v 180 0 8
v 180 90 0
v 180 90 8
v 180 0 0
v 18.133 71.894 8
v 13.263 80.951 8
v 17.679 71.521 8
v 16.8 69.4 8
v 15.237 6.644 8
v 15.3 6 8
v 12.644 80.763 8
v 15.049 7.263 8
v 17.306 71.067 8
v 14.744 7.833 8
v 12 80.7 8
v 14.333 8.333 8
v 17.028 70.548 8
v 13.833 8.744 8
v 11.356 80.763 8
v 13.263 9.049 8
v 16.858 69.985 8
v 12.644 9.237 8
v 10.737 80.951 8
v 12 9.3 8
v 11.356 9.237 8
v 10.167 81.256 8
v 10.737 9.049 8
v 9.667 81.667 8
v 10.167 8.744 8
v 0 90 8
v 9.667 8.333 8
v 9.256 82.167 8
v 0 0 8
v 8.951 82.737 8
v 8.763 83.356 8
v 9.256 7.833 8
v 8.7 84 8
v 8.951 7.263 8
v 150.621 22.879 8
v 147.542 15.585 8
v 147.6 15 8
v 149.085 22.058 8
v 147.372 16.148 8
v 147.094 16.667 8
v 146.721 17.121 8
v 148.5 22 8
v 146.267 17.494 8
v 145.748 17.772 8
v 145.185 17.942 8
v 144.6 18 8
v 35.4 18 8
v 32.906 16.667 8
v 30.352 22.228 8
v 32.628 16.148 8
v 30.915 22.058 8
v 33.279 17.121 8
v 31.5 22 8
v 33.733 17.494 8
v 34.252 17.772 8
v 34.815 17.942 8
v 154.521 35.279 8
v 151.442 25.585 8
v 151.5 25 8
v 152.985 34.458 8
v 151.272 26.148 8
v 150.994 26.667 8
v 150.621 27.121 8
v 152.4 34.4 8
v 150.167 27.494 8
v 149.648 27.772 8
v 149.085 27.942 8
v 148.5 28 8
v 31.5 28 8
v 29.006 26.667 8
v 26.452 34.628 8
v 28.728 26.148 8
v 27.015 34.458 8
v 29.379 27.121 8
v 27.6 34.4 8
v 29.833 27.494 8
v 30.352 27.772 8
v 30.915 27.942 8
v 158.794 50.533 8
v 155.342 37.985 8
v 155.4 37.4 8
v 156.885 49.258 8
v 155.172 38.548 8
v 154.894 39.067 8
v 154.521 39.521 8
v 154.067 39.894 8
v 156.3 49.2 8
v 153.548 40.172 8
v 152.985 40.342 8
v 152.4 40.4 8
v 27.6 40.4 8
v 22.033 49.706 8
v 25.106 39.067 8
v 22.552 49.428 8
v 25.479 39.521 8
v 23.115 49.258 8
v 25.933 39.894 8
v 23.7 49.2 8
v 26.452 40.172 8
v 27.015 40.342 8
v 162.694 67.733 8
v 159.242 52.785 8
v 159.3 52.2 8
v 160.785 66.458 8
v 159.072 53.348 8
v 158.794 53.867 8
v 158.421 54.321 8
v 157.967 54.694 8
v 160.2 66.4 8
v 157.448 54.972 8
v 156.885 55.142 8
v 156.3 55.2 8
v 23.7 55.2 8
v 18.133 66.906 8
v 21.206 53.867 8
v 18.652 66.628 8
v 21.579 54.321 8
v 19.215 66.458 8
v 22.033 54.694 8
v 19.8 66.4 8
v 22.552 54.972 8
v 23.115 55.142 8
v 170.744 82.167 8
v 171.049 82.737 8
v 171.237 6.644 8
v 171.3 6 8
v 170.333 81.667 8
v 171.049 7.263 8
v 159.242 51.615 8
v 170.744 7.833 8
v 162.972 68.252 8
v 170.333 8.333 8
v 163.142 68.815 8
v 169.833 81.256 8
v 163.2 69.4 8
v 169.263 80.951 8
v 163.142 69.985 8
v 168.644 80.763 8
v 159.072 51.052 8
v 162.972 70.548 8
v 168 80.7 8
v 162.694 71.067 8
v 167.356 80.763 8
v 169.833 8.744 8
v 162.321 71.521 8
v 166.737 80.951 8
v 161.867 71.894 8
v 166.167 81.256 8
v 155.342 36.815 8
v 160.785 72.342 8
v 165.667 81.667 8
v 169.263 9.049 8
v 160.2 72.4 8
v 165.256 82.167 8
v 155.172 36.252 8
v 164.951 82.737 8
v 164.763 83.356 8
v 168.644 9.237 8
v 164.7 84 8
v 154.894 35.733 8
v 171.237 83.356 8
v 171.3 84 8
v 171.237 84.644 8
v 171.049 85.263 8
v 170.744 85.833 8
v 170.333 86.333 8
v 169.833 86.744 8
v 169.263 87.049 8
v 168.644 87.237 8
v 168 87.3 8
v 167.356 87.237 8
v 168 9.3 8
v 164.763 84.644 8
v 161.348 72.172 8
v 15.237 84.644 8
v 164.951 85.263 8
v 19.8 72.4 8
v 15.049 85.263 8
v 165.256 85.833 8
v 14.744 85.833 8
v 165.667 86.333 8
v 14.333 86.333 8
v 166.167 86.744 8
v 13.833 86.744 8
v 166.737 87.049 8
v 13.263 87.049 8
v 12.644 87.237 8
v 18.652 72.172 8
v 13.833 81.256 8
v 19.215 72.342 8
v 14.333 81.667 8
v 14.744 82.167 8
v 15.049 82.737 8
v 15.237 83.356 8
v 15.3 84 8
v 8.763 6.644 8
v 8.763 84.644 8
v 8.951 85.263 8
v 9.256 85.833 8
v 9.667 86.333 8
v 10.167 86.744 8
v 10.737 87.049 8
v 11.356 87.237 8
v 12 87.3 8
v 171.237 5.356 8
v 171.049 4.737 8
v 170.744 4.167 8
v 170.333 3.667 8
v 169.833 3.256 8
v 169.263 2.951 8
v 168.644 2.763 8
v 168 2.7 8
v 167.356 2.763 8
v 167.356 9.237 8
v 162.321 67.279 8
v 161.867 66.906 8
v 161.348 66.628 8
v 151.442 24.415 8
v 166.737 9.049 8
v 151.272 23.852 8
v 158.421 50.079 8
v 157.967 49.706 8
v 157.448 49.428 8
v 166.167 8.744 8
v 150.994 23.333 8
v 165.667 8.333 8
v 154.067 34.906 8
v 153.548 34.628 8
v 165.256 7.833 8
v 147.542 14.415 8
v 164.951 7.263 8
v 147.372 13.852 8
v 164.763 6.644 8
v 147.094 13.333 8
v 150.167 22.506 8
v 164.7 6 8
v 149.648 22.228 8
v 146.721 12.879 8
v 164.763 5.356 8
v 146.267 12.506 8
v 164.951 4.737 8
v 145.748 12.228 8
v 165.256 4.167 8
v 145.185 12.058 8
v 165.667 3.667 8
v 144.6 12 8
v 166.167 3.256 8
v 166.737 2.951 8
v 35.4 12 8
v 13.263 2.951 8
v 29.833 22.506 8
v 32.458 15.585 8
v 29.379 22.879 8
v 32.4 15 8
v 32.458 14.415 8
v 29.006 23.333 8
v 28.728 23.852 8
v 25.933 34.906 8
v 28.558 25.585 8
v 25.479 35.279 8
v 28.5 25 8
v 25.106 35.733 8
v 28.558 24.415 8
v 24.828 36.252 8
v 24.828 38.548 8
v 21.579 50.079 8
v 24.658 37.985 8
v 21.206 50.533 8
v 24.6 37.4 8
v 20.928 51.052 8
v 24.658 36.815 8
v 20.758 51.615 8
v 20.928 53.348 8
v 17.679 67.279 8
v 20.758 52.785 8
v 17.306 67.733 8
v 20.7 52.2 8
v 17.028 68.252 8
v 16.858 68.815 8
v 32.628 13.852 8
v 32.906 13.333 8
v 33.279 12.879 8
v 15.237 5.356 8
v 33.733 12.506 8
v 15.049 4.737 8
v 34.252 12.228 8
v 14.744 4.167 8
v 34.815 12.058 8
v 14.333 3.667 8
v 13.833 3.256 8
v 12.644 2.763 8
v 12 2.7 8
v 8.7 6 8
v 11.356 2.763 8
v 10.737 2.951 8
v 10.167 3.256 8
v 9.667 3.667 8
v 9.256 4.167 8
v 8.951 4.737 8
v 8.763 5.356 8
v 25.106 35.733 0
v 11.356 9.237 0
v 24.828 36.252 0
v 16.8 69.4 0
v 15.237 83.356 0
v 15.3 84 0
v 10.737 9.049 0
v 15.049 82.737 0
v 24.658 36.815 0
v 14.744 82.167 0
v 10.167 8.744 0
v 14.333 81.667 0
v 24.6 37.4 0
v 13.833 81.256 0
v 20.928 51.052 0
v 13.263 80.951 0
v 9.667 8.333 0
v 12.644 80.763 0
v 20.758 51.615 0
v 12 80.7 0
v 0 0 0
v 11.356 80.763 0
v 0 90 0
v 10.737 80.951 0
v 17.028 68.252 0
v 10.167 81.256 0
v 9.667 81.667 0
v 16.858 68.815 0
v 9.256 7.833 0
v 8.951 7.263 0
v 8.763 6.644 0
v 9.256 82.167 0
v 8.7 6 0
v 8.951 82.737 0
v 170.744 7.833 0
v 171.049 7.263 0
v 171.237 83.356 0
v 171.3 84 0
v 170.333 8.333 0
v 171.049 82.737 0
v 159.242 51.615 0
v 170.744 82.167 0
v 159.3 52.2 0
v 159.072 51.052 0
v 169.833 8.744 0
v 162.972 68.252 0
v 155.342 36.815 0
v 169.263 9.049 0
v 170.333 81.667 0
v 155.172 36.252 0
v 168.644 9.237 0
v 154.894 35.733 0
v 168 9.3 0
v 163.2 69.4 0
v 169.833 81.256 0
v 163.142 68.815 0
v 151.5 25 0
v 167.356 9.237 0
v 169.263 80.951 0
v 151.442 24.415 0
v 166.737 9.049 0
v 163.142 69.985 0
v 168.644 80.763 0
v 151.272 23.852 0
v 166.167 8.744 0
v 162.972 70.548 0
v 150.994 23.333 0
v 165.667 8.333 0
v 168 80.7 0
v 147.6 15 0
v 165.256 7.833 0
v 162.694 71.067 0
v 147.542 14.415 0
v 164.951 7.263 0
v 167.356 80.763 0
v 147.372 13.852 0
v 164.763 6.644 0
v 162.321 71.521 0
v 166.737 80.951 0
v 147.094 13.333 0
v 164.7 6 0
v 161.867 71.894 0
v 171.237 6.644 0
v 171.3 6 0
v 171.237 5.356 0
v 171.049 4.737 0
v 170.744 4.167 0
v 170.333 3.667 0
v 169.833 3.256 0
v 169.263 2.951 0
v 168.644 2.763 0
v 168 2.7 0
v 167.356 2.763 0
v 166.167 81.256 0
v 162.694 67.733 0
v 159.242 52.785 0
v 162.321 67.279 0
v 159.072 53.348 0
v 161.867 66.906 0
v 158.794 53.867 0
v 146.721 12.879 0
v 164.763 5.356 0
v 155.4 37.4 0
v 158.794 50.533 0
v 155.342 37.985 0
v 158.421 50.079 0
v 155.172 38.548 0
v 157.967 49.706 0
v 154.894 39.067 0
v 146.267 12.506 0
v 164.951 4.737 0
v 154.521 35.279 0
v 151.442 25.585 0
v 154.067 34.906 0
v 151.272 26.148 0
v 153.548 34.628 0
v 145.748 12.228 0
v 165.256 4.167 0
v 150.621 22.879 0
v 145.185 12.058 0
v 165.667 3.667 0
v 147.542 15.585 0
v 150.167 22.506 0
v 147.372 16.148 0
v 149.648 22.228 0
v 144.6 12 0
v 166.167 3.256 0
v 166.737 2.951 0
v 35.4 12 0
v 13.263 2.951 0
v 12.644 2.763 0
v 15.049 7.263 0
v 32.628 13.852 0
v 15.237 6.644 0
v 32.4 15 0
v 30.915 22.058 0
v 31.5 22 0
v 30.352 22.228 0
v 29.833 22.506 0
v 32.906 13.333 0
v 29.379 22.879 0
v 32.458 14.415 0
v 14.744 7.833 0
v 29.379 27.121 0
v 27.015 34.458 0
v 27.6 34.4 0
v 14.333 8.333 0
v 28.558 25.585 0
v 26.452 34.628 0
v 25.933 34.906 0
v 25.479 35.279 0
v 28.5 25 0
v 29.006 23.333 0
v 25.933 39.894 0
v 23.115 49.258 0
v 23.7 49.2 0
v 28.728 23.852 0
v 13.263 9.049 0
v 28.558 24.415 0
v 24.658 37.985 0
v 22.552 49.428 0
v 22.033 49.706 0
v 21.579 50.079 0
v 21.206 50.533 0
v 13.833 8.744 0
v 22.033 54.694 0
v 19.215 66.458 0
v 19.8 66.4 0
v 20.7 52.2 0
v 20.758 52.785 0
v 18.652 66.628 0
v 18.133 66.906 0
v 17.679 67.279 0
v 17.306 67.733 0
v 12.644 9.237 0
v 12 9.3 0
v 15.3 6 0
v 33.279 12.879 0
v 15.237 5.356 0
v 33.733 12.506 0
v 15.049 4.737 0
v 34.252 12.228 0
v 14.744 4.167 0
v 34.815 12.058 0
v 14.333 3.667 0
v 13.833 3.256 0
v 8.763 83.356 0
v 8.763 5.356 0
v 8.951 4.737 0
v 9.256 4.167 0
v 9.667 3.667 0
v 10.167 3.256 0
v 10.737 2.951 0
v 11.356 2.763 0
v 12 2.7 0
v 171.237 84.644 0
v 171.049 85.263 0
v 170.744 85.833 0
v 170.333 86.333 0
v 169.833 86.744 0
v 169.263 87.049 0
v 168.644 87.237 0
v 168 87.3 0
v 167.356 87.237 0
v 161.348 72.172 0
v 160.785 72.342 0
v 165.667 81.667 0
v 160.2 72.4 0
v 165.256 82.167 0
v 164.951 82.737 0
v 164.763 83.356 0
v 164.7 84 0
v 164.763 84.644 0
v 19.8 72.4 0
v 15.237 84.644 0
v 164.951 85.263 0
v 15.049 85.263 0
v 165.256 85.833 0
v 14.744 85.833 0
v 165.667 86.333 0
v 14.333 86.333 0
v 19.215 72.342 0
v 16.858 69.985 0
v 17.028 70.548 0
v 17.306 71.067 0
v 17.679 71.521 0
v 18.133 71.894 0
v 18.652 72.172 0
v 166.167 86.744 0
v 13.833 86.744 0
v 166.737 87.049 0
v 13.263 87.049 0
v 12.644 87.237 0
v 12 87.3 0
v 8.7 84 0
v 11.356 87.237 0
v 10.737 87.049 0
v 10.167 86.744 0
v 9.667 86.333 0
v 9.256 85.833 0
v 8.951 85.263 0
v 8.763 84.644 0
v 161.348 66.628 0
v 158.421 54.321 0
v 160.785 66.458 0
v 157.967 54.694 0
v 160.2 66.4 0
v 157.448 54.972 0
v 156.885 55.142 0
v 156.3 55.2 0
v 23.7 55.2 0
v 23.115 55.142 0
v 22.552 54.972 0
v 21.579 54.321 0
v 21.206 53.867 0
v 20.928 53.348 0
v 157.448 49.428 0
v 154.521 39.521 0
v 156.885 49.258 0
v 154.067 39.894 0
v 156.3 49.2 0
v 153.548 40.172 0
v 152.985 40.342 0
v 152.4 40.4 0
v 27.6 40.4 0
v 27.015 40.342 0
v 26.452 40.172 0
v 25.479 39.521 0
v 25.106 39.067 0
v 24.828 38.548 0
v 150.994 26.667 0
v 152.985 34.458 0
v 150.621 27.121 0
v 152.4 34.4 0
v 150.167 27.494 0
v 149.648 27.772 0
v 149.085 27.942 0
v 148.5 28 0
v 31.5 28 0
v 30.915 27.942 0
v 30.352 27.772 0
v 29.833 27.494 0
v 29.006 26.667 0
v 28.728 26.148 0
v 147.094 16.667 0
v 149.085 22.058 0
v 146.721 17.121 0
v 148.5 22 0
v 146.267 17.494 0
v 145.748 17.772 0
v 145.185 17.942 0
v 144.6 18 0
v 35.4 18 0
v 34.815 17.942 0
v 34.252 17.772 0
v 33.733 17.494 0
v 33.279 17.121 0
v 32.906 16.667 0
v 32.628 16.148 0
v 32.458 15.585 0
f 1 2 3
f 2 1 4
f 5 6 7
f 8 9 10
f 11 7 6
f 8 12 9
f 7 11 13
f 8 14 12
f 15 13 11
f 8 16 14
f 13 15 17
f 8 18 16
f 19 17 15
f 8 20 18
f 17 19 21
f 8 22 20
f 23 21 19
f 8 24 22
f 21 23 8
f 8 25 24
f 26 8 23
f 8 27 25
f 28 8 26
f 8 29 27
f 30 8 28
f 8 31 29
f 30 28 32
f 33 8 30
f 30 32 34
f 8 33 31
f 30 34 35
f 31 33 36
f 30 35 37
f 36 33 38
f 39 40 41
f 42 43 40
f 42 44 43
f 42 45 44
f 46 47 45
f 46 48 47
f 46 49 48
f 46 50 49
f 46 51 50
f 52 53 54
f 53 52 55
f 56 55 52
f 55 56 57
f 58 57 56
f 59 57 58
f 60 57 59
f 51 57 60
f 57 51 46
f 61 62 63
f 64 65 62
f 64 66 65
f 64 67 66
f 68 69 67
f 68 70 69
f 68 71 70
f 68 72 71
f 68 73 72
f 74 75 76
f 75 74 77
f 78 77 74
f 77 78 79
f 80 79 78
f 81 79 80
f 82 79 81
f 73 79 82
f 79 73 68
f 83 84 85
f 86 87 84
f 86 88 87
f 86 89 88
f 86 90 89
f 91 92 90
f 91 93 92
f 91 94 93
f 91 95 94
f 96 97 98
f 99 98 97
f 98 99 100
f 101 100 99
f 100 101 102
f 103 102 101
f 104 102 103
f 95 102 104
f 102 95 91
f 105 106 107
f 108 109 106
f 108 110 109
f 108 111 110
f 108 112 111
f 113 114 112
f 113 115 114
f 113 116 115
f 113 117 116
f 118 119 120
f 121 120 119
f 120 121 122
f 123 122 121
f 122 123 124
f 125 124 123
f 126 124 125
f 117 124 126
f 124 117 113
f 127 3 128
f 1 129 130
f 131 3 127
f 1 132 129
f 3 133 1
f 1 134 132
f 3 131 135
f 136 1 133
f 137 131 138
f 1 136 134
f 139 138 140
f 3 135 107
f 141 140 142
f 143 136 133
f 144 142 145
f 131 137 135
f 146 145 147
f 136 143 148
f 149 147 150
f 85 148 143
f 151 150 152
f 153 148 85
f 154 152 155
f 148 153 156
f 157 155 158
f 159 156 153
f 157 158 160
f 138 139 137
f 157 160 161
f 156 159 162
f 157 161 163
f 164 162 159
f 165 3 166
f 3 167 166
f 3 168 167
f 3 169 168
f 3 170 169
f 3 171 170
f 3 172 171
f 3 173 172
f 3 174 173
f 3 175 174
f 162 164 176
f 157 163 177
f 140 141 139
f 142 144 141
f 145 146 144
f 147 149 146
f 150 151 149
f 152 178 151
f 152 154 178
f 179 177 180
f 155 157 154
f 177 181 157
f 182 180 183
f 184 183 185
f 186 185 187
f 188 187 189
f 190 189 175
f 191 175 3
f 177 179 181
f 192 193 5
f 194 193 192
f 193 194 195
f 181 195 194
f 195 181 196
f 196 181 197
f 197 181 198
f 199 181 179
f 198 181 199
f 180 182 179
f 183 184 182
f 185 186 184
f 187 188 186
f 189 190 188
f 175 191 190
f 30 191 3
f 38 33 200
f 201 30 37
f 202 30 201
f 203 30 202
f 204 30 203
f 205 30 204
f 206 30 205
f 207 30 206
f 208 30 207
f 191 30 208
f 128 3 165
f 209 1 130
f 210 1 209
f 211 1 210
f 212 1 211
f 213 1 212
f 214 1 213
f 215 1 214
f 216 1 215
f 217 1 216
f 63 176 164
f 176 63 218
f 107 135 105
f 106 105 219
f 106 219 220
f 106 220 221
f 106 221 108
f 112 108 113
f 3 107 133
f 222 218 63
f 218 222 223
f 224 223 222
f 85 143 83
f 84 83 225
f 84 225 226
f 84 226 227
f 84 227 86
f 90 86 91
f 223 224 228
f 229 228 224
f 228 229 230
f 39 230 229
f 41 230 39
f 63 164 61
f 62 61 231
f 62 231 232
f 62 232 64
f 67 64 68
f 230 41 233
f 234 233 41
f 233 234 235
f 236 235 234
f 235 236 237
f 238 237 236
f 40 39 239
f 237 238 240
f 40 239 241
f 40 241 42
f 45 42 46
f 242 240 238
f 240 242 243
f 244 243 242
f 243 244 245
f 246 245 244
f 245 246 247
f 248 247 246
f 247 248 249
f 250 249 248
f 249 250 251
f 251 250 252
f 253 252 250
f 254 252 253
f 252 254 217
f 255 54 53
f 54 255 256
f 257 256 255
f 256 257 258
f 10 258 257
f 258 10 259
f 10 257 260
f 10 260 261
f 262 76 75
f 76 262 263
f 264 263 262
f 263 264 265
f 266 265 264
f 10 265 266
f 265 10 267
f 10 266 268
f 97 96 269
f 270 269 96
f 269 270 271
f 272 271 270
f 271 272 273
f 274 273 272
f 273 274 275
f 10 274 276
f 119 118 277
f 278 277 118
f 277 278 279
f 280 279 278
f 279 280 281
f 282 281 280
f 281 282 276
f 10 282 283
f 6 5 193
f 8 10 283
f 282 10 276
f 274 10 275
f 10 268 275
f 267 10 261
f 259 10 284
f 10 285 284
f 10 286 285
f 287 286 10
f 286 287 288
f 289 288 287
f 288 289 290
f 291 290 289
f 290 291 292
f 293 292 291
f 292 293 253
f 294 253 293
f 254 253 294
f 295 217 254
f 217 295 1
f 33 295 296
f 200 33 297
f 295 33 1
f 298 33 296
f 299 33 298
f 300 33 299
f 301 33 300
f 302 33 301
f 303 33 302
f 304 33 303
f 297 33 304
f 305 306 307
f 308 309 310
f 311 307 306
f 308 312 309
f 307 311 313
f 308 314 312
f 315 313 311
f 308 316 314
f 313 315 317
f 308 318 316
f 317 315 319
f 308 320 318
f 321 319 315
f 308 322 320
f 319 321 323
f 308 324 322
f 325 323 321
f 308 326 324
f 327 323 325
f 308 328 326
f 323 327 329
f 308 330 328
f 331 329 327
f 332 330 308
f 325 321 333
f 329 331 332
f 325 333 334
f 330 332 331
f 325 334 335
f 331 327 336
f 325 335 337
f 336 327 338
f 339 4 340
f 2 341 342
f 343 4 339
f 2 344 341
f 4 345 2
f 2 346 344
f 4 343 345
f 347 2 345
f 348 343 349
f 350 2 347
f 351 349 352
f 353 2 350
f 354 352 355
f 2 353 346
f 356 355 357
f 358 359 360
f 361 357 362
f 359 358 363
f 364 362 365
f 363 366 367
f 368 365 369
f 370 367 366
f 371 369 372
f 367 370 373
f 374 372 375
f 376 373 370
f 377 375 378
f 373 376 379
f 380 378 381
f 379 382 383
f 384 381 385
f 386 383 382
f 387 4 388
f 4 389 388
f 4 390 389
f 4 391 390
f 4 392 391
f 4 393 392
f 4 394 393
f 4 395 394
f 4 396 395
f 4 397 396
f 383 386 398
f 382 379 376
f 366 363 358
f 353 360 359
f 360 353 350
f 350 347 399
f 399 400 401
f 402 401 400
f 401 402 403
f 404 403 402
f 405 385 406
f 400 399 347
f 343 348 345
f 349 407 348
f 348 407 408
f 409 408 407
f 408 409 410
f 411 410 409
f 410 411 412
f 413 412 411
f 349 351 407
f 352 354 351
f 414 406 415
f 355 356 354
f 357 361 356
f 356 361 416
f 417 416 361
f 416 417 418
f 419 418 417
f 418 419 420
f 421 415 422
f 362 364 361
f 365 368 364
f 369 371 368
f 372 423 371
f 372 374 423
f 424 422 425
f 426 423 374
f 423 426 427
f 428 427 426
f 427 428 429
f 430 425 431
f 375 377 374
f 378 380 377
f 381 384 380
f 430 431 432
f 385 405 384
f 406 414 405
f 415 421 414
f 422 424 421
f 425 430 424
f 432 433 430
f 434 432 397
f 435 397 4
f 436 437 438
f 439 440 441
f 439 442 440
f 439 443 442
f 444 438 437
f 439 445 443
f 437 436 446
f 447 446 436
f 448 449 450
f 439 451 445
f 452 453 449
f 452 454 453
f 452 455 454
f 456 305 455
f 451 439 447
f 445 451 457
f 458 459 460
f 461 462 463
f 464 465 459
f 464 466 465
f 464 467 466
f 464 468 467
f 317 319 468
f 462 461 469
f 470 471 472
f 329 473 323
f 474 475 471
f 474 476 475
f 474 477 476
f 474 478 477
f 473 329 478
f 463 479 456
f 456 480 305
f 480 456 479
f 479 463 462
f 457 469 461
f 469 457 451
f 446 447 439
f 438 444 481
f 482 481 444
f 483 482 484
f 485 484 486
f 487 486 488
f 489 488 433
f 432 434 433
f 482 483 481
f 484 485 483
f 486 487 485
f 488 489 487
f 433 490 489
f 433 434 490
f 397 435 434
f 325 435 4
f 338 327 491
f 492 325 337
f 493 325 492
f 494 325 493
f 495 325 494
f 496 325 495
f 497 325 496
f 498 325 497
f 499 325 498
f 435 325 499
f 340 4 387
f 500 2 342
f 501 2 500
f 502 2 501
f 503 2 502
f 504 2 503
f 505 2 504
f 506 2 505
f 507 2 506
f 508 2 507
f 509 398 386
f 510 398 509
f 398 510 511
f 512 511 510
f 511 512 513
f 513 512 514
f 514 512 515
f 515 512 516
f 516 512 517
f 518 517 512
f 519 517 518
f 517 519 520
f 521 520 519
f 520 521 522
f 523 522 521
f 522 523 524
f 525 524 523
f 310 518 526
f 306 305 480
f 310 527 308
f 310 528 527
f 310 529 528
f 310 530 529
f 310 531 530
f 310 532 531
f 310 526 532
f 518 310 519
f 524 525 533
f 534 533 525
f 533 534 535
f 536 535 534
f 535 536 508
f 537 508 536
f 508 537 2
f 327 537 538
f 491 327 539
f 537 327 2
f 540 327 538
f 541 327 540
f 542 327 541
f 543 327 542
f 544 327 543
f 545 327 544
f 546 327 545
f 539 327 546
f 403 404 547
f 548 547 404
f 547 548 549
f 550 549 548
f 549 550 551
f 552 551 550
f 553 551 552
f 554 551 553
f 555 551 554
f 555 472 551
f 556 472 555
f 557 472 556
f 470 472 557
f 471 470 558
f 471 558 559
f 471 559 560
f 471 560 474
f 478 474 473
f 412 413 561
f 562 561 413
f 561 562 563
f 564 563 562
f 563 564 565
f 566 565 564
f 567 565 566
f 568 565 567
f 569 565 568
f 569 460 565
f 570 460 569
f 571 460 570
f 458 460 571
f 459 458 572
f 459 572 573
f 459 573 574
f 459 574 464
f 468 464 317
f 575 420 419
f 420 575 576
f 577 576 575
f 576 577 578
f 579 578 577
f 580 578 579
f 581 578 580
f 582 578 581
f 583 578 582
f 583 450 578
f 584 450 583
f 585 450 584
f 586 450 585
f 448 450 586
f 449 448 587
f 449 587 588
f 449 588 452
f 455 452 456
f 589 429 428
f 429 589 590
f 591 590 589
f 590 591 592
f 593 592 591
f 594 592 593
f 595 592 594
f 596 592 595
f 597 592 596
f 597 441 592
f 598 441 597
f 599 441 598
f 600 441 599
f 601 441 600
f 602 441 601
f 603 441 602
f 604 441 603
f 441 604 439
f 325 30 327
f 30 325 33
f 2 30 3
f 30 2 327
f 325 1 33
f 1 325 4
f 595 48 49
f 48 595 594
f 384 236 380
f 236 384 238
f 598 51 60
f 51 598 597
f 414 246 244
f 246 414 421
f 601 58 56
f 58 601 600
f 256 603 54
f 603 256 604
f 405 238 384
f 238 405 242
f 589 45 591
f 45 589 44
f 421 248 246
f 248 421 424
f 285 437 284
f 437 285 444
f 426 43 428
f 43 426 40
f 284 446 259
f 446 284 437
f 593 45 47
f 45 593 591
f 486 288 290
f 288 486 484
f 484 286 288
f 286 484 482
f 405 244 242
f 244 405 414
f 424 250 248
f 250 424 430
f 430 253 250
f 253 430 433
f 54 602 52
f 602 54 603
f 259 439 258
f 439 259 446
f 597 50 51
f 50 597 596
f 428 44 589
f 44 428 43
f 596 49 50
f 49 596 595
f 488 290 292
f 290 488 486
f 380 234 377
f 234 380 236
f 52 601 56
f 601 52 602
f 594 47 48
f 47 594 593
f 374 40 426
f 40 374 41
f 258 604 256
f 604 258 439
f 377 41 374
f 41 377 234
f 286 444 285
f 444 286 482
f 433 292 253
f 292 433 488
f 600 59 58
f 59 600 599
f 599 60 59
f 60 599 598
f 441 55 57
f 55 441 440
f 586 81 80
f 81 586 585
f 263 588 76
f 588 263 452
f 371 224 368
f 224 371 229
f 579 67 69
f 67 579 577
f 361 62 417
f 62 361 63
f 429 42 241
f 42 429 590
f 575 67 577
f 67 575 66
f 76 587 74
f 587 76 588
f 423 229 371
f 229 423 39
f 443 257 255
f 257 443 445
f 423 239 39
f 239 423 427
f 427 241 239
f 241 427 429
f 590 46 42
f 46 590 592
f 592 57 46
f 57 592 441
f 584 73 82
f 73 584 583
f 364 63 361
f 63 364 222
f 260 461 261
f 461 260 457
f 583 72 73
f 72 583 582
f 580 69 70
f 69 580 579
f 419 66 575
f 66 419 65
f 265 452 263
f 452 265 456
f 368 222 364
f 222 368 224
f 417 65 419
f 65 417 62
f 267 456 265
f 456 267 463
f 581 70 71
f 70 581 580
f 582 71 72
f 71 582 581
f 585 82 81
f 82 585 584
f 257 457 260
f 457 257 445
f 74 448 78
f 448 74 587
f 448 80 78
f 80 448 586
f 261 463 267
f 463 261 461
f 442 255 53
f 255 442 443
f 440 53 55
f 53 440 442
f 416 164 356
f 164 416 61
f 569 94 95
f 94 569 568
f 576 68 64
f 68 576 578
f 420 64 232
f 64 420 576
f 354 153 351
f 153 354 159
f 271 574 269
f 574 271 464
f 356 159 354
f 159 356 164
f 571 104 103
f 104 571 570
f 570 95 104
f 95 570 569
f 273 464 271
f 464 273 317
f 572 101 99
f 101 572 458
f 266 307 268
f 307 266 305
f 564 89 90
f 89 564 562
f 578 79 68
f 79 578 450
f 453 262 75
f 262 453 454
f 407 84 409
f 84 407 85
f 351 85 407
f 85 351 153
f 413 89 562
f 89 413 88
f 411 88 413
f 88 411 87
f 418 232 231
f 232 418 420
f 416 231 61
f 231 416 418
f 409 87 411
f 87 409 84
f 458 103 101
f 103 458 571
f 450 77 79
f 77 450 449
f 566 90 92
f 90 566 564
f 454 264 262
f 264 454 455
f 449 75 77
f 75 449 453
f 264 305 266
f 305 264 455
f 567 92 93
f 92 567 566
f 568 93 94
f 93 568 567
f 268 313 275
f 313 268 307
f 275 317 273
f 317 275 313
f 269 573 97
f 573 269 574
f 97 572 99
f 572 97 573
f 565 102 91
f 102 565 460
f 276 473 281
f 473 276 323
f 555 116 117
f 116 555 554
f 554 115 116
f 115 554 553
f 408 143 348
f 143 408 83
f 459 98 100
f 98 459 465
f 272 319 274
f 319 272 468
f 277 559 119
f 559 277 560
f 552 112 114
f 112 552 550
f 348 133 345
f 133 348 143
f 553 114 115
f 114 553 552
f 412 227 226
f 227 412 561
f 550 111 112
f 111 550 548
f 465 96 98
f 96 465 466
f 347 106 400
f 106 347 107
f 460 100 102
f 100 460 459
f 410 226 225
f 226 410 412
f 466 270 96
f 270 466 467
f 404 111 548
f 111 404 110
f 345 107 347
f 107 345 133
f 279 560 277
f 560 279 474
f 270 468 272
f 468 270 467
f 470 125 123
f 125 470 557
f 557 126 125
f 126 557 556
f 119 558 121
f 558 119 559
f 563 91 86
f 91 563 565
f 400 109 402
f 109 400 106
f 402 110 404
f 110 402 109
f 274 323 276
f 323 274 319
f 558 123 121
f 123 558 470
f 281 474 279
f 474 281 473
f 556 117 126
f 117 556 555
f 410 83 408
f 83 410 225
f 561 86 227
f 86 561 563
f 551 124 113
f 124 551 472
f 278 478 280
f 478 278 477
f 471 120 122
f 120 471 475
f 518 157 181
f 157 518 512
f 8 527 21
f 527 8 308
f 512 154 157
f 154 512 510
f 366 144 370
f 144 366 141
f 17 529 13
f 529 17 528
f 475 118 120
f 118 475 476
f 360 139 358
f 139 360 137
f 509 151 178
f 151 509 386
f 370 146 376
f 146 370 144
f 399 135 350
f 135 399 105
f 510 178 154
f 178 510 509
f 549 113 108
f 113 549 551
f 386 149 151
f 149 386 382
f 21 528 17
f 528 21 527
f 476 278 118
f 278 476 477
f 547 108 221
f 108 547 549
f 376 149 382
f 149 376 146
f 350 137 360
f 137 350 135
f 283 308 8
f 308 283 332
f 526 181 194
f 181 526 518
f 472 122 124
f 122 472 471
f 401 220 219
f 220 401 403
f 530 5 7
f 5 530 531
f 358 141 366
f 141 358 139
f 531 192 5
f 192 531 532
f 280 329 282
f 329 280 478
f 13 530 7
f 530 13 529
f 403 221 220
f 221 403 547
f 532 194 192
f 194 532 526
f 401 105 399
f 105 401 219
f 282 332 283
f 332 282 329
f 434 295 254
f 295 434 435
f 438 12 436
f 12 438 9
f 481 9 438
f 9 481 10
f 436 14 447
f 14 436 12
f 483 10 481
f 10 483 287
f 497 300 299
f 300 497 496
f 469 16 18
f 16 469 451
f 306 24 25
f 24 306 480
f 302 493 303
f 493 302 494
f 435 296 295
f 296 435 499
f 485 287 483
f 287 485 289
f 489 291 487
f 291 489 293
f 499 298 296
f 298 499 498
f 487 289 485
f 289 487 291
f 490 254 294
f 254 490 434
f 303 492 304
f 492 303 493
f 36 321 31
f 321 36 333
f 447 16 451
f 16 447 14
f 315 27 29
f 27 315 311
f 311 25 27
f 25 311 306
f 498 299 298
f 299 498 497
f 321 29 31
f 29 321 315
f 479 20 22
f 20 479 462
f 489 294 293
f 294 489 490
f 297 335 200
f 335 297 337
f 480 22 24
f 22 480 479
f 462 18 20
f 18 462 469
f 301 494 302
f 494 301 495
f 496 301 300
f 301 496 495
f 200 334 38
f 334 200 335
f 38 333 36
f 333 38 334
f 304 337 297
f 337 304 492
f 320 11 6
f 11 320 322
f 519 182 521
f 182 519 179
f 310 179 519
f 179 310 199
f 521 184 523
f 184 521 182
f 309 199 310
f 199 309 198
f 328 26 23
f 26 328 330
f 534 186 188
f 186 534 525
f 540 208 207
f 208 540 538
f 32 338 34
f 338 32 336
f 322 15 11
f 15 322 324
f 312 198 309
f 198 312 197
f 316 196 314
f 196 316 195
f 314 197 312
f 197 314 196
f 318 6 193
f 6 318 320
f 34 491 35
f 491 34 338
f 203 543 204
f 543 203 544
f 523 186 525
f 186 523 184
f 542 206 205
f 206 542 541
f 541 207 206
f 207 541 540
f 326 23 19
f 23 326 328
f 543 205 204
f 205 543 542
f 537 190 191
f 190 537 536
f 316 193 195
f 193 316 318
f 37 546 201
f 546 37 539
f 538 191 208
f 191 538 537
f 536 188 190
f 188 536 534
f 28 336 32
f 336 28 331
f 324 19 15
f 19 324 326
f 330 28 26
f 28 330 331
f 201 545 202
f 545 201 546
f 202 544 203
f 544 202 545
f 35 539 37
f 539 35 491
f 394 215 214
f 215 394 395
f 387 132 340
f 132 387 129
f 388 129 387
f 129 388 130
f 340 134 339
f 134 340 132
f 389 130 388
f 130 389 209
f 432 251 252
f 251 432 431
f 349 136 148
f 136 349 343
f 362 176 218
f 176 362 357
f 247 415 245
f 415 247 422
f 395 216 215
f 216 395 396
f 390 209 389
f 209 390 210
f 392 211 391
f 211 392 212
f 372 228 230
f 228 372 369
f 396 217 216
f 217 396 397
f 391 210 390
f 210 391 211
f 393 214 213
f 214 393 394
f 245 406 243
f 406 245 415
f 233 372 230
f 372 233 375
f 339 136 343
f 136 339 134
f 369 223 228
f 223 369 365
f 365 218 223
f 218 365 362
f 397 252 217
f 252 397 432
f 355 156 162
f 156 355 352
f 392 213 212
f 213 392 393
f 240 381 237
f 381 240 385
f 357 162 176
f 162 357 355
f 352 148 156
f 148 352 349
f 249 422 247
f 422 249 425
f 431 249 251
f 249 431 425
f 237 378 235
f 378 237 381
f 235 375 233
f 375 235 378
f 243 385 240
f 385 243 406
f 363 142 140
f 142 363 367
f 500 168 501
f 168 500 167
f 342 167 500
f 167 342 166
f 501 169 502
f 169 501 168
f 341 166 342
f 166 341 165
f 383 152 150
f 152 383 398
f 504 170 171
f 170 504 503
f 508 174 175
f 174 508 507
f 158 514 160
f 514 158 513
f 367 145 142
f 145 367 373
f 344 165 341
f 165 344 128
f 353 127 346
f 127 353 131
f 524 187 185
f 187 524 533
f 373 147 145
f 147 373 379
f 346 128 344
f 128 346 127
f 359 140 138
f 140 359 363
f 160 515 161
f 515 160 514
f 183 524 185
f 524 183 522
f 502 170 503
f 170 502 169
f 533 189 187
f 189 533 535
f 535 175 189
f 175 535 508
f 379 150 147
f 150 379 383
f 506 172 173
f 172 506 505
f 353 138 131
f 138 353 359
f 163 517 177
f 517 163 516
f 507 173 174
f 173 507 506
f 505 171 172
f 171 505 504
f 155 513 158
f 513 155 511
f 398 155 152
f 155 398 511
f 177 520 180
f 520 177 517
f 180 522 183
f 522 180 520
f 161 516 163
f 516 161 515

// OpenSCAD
$fn = 32;

// ----------------------------------------------------------------------
// Slotted panel: 180 x 90 mm, 5 рядов of slots
// ----------------------------------------------------------------------

// --- parameters (mm) ---
panel_w = 180;            // panel width
panel_d = 90;             // panel depth
thick = 8;                // panel thickness
slot_w = 6;               // slot width
pitch0 = 10;              // first row pitch
pitch_step = 2.4;         // pitch increase per row
margin = 12;              // margin around the slot field
rows = 5;                 // number of slot rows
mount_d = 6.6;            // mounting holes
mount_x = 78;             // mounting hole offset

difference() {
  union() {
    cube([panel_w, panel_d, thick]);
  }
  /* slot rows: stadium shaped cutters, 2.5 mm clear of both faces */
  /* row 0: pitch 10, length 109.2 */
  hull() {
    translate([35.4, 15, -2.5]) cylinder(h = thick + 5, d = slot_w);
    translate([144.6, 15, -2.5]) cylinder(h = thick + 5, d = slot_w);
  }
  /* row 1: pitch 12.4, length 117 */
  hull() {
    translate([31.5, 25, -2.5]) cylinder(h = thick + 5, d = slot_w);
    translate([148.5, 25, -2.5]) cylinder(h = thick + 5, d = slot_w);
  }
  /* row 2: pitch 14.8, length 124.8 */
  hull() {
    translate([27.6, 37.4, -2.5]) cylinder(h = thick + 5, d = slot_w);
    translate([152.4, 37.4, -2.5]) cylinder(h = thick + 5, d = slot_w);
  }
  /* row 3: pitch 17.2, length 132.6 */
  hull() {
    translate([23.7, 52.2, -2.5]) cylinder(h = thick + 5, d = slot_w);
    translate([156.3, 52.2, -2.5]) cylinder(h = thick + 5, d = slot_w);
  }
  /* row 4: pitch 19.6, length 140.4 */
  hull() {
    translate([19.8, 69.4, -2.5]) cylinder(h = thick + 5, d = slot_w);
    translate([160.2, 69.4, -2.5]) cylinder(h = thick + 5, d = slot_w);
  }
  translate([12, 6, -2.5]) cylinder(h = 13, d = mount_d);
  translate([12, 84, -2.5]) cylinder(h = 13, d = mount_d);
  translate([168, 6, -2.5]) cylinder(h = 13, d = mount_d);
  translate([168, 84, -2.5]) cylinder(h = 13, d = mount_d);
}
